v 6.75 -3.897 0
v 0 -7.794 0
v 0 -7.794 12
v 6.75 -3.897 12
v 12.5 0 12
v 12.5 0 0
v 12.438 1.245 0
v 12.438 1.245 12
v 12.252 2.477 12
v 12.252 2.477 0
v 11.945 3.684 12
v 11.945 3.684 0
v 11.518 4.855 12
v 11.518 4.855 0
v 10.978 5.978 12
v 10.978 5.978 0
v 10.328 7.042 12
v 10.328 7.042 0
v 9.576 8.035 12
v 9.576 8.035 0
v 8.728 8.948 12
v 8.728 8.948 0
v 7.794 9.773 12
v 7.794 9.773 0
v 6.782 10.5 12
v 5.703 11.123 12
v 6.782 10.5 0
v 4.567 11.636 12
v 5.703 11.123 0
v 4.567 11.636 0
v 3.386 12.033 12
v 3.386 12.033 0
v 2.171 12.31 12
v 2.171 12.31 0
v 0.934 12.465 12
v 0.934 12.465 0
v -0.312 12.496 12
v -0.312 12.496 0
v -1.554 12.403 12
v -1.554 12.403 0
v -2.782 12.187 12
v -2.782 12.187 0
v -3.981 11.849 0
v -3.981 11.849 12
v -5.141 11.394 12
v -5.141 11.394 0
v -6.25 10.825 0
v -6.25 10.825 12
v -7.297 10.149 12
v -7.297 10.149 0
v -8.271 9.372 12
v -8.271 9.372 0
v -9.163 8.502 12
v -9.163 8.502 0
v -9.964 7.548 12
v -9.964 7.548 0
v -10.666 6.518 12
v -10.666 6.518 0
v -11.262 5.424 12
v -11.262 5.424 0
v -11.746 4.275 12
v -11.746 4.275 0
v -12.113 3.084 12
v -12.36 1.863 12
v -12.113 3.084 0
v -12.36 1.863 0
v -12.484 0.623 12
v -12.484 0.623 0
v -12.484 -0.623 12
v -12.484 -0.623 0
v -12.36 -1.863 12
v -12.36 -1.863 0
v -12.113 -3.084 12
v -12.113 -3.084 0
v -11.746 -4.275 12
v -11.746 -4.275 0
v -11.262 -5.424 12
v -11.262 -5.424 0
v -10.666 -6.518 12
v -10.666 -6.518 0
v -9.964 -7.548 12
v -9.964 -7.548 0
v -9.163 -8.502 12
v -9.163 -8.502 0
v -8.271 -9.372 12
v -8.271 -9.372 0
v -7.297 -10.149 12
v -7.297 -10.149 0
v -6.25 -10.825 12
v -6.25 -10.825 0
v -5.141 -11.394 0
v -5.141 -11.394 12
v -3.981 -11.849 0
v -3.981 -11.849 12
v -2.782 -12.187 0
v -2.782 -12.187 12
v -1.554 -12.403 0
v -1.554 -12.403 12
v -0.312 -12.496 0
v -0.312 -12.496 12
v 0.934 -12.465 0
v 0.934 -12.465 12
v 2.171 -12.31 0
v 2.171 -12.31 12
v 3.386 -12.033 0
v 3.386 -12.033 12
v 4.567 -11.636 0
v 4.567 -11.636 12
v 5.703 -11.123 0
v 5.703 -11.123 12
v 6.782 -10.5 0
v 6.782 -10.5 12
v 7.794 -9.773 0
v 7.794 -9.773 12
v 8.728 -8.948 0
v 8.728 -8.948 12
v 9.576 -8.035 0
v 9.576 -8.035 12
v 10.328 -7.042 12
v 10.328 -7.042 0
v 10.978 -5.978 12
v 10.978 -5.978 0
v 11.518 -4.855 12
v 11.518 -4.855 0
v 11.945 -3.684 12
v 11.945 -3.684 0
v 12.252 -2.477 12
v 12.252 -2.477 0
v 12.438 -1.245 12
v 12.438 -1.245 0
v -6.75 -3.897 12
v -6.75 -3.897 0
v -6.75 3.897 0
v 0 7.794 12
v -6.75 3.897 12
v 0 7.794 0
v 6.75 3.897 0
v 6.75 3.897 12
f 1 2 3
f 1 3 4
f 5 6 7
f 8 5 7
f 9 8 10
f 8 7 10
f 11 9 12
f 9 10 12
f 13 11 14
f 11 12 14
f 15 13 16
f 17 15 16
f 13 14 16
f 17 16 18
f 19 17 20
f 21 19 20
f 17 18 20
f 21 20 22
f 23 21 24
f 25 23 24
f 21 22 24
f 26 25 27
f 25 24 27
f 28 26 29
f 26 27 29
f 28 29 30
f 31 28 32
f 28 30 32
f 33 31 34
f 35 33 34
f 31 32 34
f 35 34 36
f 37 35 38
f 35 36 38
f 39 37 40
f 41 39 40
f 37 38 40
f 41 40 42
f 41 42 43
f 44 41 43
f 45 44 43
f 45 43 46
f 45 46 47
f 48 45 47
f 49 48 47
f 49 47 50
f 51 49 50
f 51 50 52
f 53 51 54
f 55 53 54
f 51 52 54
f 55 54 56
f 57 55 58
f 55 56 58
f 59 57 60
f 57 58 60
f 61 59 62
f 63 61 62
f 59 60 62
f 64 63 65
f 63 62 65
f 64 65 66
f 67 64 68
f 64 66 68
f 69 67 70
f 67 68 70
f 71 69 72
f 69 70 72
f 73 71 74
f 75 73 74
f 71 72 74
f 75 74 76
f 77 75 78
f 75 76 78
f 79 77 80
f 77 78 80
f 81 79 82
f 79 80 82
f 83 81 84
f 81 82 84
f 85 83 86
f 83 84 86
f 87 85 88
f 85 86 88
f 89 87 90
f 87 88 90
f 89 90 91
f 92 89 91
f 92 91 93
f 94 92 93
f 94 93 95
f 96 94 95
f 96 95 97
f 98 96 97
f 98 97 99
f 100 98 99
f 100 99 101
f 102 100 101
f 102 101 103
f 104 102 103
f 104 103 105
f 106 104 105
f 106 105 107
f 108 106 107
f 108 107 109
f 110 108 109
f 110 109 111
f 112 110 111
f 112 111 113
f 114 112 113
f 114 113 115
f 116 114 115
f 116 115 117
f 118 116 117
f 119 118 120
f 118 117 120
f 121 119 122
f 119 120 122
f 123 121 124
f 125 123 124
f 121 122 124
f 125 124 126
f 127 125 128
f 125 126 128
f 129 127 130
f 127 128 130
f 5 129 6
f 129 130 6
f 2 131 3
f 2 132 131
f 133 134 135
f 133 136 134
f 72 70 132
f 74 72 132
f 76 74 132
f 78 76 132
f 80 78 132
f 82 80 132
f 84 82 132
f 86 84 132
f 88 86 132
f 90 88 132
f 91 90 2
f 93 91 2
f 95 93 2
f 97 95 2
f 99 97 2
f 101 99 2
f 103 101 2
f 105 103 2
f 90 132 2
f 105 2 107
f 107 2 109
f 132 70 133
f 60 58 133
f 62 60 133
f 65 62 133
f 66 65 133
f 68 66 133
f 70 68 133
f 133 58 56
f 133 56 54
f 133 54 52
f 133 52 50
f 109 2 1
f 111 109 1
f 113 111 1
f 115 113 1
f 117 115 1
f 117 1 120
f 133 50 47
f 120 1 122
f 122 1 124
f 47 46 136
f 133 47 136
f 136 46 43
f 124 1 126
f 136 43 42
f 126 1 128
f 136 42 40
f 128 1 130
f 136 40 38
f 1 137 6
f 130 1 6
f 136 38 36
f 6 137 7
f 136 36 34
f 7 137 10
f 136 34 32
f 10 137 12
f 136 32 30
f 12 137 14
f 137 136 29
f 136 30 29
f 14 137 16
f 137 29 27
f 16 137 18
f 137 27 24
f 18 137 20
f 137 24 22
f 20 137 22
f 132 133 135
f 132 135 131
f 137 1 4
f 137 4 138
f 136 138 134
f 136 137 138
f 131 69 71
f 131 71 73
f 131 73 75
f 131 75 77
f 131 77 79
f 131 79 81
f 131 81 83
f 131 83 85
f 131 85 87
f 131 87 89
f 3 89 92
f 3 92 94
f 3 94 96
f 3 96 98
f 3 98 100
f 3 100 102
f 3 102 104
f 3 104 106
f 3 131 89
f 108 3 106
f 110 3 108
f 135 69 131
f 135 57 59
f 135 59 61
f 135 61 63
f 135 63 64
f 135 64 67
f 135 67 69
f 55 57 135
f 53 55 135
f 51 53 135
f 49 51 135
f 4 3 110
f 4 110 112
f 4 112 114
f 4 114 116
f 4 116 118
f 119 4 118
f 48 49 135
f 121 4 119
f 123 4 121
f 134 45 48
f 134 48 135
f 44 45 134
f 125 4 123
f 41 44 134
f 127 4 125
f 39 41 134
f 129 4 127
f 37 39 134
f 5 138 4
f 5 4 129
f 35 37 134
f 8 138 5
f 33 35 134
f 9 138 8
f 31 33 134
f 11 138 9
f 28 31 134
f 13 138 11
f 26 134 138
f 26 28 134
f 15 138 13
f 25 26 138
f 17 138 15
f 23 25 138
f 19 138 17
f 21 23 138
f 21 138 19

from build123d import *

# Parameters (mm, degrees)
F1_R          = 12.5
F2_DEPTH      = 12
F4_DEPTH      = 25
F4_DEPTH_BACK = 25
F5_OFFSET     = 0.4


with BuildPart() as f2:
    # F1 (on Top) → F2 (new body)
    with BuildSketch(Plane.XY):
        Circle(F1_R)
    extrude(amount=F2_DEPTH)


with BuildPart() as f4:
    # F3 (on face) → F4 (new body, two sides)
    with BuildSketch(Plane.XY.offset(12)) as f4_sk:
        Polygon((0, -7.3323484187), (6.35, -3.6661742094), (6.35, 3.6661742094), (0, 7.3323484187), (-6.35, 3.6661742094), (-6.35, -3.6661742094), align=None)
    extrude(amount=-F4_DEPTH)
    extrude(f4_sk.sketch, amount=F4_DEPTH_BACK)


with BuildPart() as f2_1:
    add(f2.part)

    # F5: cut F4, made larger all round first
    f5_tool = offset(f4.part, amount=F5_OFFSET, kind=Kind.INTERSECTION, mode=Mode.PRIVATE)
    add(f5_tool, mode=Mode.SUBTRACT)


solid = f2_1.part
